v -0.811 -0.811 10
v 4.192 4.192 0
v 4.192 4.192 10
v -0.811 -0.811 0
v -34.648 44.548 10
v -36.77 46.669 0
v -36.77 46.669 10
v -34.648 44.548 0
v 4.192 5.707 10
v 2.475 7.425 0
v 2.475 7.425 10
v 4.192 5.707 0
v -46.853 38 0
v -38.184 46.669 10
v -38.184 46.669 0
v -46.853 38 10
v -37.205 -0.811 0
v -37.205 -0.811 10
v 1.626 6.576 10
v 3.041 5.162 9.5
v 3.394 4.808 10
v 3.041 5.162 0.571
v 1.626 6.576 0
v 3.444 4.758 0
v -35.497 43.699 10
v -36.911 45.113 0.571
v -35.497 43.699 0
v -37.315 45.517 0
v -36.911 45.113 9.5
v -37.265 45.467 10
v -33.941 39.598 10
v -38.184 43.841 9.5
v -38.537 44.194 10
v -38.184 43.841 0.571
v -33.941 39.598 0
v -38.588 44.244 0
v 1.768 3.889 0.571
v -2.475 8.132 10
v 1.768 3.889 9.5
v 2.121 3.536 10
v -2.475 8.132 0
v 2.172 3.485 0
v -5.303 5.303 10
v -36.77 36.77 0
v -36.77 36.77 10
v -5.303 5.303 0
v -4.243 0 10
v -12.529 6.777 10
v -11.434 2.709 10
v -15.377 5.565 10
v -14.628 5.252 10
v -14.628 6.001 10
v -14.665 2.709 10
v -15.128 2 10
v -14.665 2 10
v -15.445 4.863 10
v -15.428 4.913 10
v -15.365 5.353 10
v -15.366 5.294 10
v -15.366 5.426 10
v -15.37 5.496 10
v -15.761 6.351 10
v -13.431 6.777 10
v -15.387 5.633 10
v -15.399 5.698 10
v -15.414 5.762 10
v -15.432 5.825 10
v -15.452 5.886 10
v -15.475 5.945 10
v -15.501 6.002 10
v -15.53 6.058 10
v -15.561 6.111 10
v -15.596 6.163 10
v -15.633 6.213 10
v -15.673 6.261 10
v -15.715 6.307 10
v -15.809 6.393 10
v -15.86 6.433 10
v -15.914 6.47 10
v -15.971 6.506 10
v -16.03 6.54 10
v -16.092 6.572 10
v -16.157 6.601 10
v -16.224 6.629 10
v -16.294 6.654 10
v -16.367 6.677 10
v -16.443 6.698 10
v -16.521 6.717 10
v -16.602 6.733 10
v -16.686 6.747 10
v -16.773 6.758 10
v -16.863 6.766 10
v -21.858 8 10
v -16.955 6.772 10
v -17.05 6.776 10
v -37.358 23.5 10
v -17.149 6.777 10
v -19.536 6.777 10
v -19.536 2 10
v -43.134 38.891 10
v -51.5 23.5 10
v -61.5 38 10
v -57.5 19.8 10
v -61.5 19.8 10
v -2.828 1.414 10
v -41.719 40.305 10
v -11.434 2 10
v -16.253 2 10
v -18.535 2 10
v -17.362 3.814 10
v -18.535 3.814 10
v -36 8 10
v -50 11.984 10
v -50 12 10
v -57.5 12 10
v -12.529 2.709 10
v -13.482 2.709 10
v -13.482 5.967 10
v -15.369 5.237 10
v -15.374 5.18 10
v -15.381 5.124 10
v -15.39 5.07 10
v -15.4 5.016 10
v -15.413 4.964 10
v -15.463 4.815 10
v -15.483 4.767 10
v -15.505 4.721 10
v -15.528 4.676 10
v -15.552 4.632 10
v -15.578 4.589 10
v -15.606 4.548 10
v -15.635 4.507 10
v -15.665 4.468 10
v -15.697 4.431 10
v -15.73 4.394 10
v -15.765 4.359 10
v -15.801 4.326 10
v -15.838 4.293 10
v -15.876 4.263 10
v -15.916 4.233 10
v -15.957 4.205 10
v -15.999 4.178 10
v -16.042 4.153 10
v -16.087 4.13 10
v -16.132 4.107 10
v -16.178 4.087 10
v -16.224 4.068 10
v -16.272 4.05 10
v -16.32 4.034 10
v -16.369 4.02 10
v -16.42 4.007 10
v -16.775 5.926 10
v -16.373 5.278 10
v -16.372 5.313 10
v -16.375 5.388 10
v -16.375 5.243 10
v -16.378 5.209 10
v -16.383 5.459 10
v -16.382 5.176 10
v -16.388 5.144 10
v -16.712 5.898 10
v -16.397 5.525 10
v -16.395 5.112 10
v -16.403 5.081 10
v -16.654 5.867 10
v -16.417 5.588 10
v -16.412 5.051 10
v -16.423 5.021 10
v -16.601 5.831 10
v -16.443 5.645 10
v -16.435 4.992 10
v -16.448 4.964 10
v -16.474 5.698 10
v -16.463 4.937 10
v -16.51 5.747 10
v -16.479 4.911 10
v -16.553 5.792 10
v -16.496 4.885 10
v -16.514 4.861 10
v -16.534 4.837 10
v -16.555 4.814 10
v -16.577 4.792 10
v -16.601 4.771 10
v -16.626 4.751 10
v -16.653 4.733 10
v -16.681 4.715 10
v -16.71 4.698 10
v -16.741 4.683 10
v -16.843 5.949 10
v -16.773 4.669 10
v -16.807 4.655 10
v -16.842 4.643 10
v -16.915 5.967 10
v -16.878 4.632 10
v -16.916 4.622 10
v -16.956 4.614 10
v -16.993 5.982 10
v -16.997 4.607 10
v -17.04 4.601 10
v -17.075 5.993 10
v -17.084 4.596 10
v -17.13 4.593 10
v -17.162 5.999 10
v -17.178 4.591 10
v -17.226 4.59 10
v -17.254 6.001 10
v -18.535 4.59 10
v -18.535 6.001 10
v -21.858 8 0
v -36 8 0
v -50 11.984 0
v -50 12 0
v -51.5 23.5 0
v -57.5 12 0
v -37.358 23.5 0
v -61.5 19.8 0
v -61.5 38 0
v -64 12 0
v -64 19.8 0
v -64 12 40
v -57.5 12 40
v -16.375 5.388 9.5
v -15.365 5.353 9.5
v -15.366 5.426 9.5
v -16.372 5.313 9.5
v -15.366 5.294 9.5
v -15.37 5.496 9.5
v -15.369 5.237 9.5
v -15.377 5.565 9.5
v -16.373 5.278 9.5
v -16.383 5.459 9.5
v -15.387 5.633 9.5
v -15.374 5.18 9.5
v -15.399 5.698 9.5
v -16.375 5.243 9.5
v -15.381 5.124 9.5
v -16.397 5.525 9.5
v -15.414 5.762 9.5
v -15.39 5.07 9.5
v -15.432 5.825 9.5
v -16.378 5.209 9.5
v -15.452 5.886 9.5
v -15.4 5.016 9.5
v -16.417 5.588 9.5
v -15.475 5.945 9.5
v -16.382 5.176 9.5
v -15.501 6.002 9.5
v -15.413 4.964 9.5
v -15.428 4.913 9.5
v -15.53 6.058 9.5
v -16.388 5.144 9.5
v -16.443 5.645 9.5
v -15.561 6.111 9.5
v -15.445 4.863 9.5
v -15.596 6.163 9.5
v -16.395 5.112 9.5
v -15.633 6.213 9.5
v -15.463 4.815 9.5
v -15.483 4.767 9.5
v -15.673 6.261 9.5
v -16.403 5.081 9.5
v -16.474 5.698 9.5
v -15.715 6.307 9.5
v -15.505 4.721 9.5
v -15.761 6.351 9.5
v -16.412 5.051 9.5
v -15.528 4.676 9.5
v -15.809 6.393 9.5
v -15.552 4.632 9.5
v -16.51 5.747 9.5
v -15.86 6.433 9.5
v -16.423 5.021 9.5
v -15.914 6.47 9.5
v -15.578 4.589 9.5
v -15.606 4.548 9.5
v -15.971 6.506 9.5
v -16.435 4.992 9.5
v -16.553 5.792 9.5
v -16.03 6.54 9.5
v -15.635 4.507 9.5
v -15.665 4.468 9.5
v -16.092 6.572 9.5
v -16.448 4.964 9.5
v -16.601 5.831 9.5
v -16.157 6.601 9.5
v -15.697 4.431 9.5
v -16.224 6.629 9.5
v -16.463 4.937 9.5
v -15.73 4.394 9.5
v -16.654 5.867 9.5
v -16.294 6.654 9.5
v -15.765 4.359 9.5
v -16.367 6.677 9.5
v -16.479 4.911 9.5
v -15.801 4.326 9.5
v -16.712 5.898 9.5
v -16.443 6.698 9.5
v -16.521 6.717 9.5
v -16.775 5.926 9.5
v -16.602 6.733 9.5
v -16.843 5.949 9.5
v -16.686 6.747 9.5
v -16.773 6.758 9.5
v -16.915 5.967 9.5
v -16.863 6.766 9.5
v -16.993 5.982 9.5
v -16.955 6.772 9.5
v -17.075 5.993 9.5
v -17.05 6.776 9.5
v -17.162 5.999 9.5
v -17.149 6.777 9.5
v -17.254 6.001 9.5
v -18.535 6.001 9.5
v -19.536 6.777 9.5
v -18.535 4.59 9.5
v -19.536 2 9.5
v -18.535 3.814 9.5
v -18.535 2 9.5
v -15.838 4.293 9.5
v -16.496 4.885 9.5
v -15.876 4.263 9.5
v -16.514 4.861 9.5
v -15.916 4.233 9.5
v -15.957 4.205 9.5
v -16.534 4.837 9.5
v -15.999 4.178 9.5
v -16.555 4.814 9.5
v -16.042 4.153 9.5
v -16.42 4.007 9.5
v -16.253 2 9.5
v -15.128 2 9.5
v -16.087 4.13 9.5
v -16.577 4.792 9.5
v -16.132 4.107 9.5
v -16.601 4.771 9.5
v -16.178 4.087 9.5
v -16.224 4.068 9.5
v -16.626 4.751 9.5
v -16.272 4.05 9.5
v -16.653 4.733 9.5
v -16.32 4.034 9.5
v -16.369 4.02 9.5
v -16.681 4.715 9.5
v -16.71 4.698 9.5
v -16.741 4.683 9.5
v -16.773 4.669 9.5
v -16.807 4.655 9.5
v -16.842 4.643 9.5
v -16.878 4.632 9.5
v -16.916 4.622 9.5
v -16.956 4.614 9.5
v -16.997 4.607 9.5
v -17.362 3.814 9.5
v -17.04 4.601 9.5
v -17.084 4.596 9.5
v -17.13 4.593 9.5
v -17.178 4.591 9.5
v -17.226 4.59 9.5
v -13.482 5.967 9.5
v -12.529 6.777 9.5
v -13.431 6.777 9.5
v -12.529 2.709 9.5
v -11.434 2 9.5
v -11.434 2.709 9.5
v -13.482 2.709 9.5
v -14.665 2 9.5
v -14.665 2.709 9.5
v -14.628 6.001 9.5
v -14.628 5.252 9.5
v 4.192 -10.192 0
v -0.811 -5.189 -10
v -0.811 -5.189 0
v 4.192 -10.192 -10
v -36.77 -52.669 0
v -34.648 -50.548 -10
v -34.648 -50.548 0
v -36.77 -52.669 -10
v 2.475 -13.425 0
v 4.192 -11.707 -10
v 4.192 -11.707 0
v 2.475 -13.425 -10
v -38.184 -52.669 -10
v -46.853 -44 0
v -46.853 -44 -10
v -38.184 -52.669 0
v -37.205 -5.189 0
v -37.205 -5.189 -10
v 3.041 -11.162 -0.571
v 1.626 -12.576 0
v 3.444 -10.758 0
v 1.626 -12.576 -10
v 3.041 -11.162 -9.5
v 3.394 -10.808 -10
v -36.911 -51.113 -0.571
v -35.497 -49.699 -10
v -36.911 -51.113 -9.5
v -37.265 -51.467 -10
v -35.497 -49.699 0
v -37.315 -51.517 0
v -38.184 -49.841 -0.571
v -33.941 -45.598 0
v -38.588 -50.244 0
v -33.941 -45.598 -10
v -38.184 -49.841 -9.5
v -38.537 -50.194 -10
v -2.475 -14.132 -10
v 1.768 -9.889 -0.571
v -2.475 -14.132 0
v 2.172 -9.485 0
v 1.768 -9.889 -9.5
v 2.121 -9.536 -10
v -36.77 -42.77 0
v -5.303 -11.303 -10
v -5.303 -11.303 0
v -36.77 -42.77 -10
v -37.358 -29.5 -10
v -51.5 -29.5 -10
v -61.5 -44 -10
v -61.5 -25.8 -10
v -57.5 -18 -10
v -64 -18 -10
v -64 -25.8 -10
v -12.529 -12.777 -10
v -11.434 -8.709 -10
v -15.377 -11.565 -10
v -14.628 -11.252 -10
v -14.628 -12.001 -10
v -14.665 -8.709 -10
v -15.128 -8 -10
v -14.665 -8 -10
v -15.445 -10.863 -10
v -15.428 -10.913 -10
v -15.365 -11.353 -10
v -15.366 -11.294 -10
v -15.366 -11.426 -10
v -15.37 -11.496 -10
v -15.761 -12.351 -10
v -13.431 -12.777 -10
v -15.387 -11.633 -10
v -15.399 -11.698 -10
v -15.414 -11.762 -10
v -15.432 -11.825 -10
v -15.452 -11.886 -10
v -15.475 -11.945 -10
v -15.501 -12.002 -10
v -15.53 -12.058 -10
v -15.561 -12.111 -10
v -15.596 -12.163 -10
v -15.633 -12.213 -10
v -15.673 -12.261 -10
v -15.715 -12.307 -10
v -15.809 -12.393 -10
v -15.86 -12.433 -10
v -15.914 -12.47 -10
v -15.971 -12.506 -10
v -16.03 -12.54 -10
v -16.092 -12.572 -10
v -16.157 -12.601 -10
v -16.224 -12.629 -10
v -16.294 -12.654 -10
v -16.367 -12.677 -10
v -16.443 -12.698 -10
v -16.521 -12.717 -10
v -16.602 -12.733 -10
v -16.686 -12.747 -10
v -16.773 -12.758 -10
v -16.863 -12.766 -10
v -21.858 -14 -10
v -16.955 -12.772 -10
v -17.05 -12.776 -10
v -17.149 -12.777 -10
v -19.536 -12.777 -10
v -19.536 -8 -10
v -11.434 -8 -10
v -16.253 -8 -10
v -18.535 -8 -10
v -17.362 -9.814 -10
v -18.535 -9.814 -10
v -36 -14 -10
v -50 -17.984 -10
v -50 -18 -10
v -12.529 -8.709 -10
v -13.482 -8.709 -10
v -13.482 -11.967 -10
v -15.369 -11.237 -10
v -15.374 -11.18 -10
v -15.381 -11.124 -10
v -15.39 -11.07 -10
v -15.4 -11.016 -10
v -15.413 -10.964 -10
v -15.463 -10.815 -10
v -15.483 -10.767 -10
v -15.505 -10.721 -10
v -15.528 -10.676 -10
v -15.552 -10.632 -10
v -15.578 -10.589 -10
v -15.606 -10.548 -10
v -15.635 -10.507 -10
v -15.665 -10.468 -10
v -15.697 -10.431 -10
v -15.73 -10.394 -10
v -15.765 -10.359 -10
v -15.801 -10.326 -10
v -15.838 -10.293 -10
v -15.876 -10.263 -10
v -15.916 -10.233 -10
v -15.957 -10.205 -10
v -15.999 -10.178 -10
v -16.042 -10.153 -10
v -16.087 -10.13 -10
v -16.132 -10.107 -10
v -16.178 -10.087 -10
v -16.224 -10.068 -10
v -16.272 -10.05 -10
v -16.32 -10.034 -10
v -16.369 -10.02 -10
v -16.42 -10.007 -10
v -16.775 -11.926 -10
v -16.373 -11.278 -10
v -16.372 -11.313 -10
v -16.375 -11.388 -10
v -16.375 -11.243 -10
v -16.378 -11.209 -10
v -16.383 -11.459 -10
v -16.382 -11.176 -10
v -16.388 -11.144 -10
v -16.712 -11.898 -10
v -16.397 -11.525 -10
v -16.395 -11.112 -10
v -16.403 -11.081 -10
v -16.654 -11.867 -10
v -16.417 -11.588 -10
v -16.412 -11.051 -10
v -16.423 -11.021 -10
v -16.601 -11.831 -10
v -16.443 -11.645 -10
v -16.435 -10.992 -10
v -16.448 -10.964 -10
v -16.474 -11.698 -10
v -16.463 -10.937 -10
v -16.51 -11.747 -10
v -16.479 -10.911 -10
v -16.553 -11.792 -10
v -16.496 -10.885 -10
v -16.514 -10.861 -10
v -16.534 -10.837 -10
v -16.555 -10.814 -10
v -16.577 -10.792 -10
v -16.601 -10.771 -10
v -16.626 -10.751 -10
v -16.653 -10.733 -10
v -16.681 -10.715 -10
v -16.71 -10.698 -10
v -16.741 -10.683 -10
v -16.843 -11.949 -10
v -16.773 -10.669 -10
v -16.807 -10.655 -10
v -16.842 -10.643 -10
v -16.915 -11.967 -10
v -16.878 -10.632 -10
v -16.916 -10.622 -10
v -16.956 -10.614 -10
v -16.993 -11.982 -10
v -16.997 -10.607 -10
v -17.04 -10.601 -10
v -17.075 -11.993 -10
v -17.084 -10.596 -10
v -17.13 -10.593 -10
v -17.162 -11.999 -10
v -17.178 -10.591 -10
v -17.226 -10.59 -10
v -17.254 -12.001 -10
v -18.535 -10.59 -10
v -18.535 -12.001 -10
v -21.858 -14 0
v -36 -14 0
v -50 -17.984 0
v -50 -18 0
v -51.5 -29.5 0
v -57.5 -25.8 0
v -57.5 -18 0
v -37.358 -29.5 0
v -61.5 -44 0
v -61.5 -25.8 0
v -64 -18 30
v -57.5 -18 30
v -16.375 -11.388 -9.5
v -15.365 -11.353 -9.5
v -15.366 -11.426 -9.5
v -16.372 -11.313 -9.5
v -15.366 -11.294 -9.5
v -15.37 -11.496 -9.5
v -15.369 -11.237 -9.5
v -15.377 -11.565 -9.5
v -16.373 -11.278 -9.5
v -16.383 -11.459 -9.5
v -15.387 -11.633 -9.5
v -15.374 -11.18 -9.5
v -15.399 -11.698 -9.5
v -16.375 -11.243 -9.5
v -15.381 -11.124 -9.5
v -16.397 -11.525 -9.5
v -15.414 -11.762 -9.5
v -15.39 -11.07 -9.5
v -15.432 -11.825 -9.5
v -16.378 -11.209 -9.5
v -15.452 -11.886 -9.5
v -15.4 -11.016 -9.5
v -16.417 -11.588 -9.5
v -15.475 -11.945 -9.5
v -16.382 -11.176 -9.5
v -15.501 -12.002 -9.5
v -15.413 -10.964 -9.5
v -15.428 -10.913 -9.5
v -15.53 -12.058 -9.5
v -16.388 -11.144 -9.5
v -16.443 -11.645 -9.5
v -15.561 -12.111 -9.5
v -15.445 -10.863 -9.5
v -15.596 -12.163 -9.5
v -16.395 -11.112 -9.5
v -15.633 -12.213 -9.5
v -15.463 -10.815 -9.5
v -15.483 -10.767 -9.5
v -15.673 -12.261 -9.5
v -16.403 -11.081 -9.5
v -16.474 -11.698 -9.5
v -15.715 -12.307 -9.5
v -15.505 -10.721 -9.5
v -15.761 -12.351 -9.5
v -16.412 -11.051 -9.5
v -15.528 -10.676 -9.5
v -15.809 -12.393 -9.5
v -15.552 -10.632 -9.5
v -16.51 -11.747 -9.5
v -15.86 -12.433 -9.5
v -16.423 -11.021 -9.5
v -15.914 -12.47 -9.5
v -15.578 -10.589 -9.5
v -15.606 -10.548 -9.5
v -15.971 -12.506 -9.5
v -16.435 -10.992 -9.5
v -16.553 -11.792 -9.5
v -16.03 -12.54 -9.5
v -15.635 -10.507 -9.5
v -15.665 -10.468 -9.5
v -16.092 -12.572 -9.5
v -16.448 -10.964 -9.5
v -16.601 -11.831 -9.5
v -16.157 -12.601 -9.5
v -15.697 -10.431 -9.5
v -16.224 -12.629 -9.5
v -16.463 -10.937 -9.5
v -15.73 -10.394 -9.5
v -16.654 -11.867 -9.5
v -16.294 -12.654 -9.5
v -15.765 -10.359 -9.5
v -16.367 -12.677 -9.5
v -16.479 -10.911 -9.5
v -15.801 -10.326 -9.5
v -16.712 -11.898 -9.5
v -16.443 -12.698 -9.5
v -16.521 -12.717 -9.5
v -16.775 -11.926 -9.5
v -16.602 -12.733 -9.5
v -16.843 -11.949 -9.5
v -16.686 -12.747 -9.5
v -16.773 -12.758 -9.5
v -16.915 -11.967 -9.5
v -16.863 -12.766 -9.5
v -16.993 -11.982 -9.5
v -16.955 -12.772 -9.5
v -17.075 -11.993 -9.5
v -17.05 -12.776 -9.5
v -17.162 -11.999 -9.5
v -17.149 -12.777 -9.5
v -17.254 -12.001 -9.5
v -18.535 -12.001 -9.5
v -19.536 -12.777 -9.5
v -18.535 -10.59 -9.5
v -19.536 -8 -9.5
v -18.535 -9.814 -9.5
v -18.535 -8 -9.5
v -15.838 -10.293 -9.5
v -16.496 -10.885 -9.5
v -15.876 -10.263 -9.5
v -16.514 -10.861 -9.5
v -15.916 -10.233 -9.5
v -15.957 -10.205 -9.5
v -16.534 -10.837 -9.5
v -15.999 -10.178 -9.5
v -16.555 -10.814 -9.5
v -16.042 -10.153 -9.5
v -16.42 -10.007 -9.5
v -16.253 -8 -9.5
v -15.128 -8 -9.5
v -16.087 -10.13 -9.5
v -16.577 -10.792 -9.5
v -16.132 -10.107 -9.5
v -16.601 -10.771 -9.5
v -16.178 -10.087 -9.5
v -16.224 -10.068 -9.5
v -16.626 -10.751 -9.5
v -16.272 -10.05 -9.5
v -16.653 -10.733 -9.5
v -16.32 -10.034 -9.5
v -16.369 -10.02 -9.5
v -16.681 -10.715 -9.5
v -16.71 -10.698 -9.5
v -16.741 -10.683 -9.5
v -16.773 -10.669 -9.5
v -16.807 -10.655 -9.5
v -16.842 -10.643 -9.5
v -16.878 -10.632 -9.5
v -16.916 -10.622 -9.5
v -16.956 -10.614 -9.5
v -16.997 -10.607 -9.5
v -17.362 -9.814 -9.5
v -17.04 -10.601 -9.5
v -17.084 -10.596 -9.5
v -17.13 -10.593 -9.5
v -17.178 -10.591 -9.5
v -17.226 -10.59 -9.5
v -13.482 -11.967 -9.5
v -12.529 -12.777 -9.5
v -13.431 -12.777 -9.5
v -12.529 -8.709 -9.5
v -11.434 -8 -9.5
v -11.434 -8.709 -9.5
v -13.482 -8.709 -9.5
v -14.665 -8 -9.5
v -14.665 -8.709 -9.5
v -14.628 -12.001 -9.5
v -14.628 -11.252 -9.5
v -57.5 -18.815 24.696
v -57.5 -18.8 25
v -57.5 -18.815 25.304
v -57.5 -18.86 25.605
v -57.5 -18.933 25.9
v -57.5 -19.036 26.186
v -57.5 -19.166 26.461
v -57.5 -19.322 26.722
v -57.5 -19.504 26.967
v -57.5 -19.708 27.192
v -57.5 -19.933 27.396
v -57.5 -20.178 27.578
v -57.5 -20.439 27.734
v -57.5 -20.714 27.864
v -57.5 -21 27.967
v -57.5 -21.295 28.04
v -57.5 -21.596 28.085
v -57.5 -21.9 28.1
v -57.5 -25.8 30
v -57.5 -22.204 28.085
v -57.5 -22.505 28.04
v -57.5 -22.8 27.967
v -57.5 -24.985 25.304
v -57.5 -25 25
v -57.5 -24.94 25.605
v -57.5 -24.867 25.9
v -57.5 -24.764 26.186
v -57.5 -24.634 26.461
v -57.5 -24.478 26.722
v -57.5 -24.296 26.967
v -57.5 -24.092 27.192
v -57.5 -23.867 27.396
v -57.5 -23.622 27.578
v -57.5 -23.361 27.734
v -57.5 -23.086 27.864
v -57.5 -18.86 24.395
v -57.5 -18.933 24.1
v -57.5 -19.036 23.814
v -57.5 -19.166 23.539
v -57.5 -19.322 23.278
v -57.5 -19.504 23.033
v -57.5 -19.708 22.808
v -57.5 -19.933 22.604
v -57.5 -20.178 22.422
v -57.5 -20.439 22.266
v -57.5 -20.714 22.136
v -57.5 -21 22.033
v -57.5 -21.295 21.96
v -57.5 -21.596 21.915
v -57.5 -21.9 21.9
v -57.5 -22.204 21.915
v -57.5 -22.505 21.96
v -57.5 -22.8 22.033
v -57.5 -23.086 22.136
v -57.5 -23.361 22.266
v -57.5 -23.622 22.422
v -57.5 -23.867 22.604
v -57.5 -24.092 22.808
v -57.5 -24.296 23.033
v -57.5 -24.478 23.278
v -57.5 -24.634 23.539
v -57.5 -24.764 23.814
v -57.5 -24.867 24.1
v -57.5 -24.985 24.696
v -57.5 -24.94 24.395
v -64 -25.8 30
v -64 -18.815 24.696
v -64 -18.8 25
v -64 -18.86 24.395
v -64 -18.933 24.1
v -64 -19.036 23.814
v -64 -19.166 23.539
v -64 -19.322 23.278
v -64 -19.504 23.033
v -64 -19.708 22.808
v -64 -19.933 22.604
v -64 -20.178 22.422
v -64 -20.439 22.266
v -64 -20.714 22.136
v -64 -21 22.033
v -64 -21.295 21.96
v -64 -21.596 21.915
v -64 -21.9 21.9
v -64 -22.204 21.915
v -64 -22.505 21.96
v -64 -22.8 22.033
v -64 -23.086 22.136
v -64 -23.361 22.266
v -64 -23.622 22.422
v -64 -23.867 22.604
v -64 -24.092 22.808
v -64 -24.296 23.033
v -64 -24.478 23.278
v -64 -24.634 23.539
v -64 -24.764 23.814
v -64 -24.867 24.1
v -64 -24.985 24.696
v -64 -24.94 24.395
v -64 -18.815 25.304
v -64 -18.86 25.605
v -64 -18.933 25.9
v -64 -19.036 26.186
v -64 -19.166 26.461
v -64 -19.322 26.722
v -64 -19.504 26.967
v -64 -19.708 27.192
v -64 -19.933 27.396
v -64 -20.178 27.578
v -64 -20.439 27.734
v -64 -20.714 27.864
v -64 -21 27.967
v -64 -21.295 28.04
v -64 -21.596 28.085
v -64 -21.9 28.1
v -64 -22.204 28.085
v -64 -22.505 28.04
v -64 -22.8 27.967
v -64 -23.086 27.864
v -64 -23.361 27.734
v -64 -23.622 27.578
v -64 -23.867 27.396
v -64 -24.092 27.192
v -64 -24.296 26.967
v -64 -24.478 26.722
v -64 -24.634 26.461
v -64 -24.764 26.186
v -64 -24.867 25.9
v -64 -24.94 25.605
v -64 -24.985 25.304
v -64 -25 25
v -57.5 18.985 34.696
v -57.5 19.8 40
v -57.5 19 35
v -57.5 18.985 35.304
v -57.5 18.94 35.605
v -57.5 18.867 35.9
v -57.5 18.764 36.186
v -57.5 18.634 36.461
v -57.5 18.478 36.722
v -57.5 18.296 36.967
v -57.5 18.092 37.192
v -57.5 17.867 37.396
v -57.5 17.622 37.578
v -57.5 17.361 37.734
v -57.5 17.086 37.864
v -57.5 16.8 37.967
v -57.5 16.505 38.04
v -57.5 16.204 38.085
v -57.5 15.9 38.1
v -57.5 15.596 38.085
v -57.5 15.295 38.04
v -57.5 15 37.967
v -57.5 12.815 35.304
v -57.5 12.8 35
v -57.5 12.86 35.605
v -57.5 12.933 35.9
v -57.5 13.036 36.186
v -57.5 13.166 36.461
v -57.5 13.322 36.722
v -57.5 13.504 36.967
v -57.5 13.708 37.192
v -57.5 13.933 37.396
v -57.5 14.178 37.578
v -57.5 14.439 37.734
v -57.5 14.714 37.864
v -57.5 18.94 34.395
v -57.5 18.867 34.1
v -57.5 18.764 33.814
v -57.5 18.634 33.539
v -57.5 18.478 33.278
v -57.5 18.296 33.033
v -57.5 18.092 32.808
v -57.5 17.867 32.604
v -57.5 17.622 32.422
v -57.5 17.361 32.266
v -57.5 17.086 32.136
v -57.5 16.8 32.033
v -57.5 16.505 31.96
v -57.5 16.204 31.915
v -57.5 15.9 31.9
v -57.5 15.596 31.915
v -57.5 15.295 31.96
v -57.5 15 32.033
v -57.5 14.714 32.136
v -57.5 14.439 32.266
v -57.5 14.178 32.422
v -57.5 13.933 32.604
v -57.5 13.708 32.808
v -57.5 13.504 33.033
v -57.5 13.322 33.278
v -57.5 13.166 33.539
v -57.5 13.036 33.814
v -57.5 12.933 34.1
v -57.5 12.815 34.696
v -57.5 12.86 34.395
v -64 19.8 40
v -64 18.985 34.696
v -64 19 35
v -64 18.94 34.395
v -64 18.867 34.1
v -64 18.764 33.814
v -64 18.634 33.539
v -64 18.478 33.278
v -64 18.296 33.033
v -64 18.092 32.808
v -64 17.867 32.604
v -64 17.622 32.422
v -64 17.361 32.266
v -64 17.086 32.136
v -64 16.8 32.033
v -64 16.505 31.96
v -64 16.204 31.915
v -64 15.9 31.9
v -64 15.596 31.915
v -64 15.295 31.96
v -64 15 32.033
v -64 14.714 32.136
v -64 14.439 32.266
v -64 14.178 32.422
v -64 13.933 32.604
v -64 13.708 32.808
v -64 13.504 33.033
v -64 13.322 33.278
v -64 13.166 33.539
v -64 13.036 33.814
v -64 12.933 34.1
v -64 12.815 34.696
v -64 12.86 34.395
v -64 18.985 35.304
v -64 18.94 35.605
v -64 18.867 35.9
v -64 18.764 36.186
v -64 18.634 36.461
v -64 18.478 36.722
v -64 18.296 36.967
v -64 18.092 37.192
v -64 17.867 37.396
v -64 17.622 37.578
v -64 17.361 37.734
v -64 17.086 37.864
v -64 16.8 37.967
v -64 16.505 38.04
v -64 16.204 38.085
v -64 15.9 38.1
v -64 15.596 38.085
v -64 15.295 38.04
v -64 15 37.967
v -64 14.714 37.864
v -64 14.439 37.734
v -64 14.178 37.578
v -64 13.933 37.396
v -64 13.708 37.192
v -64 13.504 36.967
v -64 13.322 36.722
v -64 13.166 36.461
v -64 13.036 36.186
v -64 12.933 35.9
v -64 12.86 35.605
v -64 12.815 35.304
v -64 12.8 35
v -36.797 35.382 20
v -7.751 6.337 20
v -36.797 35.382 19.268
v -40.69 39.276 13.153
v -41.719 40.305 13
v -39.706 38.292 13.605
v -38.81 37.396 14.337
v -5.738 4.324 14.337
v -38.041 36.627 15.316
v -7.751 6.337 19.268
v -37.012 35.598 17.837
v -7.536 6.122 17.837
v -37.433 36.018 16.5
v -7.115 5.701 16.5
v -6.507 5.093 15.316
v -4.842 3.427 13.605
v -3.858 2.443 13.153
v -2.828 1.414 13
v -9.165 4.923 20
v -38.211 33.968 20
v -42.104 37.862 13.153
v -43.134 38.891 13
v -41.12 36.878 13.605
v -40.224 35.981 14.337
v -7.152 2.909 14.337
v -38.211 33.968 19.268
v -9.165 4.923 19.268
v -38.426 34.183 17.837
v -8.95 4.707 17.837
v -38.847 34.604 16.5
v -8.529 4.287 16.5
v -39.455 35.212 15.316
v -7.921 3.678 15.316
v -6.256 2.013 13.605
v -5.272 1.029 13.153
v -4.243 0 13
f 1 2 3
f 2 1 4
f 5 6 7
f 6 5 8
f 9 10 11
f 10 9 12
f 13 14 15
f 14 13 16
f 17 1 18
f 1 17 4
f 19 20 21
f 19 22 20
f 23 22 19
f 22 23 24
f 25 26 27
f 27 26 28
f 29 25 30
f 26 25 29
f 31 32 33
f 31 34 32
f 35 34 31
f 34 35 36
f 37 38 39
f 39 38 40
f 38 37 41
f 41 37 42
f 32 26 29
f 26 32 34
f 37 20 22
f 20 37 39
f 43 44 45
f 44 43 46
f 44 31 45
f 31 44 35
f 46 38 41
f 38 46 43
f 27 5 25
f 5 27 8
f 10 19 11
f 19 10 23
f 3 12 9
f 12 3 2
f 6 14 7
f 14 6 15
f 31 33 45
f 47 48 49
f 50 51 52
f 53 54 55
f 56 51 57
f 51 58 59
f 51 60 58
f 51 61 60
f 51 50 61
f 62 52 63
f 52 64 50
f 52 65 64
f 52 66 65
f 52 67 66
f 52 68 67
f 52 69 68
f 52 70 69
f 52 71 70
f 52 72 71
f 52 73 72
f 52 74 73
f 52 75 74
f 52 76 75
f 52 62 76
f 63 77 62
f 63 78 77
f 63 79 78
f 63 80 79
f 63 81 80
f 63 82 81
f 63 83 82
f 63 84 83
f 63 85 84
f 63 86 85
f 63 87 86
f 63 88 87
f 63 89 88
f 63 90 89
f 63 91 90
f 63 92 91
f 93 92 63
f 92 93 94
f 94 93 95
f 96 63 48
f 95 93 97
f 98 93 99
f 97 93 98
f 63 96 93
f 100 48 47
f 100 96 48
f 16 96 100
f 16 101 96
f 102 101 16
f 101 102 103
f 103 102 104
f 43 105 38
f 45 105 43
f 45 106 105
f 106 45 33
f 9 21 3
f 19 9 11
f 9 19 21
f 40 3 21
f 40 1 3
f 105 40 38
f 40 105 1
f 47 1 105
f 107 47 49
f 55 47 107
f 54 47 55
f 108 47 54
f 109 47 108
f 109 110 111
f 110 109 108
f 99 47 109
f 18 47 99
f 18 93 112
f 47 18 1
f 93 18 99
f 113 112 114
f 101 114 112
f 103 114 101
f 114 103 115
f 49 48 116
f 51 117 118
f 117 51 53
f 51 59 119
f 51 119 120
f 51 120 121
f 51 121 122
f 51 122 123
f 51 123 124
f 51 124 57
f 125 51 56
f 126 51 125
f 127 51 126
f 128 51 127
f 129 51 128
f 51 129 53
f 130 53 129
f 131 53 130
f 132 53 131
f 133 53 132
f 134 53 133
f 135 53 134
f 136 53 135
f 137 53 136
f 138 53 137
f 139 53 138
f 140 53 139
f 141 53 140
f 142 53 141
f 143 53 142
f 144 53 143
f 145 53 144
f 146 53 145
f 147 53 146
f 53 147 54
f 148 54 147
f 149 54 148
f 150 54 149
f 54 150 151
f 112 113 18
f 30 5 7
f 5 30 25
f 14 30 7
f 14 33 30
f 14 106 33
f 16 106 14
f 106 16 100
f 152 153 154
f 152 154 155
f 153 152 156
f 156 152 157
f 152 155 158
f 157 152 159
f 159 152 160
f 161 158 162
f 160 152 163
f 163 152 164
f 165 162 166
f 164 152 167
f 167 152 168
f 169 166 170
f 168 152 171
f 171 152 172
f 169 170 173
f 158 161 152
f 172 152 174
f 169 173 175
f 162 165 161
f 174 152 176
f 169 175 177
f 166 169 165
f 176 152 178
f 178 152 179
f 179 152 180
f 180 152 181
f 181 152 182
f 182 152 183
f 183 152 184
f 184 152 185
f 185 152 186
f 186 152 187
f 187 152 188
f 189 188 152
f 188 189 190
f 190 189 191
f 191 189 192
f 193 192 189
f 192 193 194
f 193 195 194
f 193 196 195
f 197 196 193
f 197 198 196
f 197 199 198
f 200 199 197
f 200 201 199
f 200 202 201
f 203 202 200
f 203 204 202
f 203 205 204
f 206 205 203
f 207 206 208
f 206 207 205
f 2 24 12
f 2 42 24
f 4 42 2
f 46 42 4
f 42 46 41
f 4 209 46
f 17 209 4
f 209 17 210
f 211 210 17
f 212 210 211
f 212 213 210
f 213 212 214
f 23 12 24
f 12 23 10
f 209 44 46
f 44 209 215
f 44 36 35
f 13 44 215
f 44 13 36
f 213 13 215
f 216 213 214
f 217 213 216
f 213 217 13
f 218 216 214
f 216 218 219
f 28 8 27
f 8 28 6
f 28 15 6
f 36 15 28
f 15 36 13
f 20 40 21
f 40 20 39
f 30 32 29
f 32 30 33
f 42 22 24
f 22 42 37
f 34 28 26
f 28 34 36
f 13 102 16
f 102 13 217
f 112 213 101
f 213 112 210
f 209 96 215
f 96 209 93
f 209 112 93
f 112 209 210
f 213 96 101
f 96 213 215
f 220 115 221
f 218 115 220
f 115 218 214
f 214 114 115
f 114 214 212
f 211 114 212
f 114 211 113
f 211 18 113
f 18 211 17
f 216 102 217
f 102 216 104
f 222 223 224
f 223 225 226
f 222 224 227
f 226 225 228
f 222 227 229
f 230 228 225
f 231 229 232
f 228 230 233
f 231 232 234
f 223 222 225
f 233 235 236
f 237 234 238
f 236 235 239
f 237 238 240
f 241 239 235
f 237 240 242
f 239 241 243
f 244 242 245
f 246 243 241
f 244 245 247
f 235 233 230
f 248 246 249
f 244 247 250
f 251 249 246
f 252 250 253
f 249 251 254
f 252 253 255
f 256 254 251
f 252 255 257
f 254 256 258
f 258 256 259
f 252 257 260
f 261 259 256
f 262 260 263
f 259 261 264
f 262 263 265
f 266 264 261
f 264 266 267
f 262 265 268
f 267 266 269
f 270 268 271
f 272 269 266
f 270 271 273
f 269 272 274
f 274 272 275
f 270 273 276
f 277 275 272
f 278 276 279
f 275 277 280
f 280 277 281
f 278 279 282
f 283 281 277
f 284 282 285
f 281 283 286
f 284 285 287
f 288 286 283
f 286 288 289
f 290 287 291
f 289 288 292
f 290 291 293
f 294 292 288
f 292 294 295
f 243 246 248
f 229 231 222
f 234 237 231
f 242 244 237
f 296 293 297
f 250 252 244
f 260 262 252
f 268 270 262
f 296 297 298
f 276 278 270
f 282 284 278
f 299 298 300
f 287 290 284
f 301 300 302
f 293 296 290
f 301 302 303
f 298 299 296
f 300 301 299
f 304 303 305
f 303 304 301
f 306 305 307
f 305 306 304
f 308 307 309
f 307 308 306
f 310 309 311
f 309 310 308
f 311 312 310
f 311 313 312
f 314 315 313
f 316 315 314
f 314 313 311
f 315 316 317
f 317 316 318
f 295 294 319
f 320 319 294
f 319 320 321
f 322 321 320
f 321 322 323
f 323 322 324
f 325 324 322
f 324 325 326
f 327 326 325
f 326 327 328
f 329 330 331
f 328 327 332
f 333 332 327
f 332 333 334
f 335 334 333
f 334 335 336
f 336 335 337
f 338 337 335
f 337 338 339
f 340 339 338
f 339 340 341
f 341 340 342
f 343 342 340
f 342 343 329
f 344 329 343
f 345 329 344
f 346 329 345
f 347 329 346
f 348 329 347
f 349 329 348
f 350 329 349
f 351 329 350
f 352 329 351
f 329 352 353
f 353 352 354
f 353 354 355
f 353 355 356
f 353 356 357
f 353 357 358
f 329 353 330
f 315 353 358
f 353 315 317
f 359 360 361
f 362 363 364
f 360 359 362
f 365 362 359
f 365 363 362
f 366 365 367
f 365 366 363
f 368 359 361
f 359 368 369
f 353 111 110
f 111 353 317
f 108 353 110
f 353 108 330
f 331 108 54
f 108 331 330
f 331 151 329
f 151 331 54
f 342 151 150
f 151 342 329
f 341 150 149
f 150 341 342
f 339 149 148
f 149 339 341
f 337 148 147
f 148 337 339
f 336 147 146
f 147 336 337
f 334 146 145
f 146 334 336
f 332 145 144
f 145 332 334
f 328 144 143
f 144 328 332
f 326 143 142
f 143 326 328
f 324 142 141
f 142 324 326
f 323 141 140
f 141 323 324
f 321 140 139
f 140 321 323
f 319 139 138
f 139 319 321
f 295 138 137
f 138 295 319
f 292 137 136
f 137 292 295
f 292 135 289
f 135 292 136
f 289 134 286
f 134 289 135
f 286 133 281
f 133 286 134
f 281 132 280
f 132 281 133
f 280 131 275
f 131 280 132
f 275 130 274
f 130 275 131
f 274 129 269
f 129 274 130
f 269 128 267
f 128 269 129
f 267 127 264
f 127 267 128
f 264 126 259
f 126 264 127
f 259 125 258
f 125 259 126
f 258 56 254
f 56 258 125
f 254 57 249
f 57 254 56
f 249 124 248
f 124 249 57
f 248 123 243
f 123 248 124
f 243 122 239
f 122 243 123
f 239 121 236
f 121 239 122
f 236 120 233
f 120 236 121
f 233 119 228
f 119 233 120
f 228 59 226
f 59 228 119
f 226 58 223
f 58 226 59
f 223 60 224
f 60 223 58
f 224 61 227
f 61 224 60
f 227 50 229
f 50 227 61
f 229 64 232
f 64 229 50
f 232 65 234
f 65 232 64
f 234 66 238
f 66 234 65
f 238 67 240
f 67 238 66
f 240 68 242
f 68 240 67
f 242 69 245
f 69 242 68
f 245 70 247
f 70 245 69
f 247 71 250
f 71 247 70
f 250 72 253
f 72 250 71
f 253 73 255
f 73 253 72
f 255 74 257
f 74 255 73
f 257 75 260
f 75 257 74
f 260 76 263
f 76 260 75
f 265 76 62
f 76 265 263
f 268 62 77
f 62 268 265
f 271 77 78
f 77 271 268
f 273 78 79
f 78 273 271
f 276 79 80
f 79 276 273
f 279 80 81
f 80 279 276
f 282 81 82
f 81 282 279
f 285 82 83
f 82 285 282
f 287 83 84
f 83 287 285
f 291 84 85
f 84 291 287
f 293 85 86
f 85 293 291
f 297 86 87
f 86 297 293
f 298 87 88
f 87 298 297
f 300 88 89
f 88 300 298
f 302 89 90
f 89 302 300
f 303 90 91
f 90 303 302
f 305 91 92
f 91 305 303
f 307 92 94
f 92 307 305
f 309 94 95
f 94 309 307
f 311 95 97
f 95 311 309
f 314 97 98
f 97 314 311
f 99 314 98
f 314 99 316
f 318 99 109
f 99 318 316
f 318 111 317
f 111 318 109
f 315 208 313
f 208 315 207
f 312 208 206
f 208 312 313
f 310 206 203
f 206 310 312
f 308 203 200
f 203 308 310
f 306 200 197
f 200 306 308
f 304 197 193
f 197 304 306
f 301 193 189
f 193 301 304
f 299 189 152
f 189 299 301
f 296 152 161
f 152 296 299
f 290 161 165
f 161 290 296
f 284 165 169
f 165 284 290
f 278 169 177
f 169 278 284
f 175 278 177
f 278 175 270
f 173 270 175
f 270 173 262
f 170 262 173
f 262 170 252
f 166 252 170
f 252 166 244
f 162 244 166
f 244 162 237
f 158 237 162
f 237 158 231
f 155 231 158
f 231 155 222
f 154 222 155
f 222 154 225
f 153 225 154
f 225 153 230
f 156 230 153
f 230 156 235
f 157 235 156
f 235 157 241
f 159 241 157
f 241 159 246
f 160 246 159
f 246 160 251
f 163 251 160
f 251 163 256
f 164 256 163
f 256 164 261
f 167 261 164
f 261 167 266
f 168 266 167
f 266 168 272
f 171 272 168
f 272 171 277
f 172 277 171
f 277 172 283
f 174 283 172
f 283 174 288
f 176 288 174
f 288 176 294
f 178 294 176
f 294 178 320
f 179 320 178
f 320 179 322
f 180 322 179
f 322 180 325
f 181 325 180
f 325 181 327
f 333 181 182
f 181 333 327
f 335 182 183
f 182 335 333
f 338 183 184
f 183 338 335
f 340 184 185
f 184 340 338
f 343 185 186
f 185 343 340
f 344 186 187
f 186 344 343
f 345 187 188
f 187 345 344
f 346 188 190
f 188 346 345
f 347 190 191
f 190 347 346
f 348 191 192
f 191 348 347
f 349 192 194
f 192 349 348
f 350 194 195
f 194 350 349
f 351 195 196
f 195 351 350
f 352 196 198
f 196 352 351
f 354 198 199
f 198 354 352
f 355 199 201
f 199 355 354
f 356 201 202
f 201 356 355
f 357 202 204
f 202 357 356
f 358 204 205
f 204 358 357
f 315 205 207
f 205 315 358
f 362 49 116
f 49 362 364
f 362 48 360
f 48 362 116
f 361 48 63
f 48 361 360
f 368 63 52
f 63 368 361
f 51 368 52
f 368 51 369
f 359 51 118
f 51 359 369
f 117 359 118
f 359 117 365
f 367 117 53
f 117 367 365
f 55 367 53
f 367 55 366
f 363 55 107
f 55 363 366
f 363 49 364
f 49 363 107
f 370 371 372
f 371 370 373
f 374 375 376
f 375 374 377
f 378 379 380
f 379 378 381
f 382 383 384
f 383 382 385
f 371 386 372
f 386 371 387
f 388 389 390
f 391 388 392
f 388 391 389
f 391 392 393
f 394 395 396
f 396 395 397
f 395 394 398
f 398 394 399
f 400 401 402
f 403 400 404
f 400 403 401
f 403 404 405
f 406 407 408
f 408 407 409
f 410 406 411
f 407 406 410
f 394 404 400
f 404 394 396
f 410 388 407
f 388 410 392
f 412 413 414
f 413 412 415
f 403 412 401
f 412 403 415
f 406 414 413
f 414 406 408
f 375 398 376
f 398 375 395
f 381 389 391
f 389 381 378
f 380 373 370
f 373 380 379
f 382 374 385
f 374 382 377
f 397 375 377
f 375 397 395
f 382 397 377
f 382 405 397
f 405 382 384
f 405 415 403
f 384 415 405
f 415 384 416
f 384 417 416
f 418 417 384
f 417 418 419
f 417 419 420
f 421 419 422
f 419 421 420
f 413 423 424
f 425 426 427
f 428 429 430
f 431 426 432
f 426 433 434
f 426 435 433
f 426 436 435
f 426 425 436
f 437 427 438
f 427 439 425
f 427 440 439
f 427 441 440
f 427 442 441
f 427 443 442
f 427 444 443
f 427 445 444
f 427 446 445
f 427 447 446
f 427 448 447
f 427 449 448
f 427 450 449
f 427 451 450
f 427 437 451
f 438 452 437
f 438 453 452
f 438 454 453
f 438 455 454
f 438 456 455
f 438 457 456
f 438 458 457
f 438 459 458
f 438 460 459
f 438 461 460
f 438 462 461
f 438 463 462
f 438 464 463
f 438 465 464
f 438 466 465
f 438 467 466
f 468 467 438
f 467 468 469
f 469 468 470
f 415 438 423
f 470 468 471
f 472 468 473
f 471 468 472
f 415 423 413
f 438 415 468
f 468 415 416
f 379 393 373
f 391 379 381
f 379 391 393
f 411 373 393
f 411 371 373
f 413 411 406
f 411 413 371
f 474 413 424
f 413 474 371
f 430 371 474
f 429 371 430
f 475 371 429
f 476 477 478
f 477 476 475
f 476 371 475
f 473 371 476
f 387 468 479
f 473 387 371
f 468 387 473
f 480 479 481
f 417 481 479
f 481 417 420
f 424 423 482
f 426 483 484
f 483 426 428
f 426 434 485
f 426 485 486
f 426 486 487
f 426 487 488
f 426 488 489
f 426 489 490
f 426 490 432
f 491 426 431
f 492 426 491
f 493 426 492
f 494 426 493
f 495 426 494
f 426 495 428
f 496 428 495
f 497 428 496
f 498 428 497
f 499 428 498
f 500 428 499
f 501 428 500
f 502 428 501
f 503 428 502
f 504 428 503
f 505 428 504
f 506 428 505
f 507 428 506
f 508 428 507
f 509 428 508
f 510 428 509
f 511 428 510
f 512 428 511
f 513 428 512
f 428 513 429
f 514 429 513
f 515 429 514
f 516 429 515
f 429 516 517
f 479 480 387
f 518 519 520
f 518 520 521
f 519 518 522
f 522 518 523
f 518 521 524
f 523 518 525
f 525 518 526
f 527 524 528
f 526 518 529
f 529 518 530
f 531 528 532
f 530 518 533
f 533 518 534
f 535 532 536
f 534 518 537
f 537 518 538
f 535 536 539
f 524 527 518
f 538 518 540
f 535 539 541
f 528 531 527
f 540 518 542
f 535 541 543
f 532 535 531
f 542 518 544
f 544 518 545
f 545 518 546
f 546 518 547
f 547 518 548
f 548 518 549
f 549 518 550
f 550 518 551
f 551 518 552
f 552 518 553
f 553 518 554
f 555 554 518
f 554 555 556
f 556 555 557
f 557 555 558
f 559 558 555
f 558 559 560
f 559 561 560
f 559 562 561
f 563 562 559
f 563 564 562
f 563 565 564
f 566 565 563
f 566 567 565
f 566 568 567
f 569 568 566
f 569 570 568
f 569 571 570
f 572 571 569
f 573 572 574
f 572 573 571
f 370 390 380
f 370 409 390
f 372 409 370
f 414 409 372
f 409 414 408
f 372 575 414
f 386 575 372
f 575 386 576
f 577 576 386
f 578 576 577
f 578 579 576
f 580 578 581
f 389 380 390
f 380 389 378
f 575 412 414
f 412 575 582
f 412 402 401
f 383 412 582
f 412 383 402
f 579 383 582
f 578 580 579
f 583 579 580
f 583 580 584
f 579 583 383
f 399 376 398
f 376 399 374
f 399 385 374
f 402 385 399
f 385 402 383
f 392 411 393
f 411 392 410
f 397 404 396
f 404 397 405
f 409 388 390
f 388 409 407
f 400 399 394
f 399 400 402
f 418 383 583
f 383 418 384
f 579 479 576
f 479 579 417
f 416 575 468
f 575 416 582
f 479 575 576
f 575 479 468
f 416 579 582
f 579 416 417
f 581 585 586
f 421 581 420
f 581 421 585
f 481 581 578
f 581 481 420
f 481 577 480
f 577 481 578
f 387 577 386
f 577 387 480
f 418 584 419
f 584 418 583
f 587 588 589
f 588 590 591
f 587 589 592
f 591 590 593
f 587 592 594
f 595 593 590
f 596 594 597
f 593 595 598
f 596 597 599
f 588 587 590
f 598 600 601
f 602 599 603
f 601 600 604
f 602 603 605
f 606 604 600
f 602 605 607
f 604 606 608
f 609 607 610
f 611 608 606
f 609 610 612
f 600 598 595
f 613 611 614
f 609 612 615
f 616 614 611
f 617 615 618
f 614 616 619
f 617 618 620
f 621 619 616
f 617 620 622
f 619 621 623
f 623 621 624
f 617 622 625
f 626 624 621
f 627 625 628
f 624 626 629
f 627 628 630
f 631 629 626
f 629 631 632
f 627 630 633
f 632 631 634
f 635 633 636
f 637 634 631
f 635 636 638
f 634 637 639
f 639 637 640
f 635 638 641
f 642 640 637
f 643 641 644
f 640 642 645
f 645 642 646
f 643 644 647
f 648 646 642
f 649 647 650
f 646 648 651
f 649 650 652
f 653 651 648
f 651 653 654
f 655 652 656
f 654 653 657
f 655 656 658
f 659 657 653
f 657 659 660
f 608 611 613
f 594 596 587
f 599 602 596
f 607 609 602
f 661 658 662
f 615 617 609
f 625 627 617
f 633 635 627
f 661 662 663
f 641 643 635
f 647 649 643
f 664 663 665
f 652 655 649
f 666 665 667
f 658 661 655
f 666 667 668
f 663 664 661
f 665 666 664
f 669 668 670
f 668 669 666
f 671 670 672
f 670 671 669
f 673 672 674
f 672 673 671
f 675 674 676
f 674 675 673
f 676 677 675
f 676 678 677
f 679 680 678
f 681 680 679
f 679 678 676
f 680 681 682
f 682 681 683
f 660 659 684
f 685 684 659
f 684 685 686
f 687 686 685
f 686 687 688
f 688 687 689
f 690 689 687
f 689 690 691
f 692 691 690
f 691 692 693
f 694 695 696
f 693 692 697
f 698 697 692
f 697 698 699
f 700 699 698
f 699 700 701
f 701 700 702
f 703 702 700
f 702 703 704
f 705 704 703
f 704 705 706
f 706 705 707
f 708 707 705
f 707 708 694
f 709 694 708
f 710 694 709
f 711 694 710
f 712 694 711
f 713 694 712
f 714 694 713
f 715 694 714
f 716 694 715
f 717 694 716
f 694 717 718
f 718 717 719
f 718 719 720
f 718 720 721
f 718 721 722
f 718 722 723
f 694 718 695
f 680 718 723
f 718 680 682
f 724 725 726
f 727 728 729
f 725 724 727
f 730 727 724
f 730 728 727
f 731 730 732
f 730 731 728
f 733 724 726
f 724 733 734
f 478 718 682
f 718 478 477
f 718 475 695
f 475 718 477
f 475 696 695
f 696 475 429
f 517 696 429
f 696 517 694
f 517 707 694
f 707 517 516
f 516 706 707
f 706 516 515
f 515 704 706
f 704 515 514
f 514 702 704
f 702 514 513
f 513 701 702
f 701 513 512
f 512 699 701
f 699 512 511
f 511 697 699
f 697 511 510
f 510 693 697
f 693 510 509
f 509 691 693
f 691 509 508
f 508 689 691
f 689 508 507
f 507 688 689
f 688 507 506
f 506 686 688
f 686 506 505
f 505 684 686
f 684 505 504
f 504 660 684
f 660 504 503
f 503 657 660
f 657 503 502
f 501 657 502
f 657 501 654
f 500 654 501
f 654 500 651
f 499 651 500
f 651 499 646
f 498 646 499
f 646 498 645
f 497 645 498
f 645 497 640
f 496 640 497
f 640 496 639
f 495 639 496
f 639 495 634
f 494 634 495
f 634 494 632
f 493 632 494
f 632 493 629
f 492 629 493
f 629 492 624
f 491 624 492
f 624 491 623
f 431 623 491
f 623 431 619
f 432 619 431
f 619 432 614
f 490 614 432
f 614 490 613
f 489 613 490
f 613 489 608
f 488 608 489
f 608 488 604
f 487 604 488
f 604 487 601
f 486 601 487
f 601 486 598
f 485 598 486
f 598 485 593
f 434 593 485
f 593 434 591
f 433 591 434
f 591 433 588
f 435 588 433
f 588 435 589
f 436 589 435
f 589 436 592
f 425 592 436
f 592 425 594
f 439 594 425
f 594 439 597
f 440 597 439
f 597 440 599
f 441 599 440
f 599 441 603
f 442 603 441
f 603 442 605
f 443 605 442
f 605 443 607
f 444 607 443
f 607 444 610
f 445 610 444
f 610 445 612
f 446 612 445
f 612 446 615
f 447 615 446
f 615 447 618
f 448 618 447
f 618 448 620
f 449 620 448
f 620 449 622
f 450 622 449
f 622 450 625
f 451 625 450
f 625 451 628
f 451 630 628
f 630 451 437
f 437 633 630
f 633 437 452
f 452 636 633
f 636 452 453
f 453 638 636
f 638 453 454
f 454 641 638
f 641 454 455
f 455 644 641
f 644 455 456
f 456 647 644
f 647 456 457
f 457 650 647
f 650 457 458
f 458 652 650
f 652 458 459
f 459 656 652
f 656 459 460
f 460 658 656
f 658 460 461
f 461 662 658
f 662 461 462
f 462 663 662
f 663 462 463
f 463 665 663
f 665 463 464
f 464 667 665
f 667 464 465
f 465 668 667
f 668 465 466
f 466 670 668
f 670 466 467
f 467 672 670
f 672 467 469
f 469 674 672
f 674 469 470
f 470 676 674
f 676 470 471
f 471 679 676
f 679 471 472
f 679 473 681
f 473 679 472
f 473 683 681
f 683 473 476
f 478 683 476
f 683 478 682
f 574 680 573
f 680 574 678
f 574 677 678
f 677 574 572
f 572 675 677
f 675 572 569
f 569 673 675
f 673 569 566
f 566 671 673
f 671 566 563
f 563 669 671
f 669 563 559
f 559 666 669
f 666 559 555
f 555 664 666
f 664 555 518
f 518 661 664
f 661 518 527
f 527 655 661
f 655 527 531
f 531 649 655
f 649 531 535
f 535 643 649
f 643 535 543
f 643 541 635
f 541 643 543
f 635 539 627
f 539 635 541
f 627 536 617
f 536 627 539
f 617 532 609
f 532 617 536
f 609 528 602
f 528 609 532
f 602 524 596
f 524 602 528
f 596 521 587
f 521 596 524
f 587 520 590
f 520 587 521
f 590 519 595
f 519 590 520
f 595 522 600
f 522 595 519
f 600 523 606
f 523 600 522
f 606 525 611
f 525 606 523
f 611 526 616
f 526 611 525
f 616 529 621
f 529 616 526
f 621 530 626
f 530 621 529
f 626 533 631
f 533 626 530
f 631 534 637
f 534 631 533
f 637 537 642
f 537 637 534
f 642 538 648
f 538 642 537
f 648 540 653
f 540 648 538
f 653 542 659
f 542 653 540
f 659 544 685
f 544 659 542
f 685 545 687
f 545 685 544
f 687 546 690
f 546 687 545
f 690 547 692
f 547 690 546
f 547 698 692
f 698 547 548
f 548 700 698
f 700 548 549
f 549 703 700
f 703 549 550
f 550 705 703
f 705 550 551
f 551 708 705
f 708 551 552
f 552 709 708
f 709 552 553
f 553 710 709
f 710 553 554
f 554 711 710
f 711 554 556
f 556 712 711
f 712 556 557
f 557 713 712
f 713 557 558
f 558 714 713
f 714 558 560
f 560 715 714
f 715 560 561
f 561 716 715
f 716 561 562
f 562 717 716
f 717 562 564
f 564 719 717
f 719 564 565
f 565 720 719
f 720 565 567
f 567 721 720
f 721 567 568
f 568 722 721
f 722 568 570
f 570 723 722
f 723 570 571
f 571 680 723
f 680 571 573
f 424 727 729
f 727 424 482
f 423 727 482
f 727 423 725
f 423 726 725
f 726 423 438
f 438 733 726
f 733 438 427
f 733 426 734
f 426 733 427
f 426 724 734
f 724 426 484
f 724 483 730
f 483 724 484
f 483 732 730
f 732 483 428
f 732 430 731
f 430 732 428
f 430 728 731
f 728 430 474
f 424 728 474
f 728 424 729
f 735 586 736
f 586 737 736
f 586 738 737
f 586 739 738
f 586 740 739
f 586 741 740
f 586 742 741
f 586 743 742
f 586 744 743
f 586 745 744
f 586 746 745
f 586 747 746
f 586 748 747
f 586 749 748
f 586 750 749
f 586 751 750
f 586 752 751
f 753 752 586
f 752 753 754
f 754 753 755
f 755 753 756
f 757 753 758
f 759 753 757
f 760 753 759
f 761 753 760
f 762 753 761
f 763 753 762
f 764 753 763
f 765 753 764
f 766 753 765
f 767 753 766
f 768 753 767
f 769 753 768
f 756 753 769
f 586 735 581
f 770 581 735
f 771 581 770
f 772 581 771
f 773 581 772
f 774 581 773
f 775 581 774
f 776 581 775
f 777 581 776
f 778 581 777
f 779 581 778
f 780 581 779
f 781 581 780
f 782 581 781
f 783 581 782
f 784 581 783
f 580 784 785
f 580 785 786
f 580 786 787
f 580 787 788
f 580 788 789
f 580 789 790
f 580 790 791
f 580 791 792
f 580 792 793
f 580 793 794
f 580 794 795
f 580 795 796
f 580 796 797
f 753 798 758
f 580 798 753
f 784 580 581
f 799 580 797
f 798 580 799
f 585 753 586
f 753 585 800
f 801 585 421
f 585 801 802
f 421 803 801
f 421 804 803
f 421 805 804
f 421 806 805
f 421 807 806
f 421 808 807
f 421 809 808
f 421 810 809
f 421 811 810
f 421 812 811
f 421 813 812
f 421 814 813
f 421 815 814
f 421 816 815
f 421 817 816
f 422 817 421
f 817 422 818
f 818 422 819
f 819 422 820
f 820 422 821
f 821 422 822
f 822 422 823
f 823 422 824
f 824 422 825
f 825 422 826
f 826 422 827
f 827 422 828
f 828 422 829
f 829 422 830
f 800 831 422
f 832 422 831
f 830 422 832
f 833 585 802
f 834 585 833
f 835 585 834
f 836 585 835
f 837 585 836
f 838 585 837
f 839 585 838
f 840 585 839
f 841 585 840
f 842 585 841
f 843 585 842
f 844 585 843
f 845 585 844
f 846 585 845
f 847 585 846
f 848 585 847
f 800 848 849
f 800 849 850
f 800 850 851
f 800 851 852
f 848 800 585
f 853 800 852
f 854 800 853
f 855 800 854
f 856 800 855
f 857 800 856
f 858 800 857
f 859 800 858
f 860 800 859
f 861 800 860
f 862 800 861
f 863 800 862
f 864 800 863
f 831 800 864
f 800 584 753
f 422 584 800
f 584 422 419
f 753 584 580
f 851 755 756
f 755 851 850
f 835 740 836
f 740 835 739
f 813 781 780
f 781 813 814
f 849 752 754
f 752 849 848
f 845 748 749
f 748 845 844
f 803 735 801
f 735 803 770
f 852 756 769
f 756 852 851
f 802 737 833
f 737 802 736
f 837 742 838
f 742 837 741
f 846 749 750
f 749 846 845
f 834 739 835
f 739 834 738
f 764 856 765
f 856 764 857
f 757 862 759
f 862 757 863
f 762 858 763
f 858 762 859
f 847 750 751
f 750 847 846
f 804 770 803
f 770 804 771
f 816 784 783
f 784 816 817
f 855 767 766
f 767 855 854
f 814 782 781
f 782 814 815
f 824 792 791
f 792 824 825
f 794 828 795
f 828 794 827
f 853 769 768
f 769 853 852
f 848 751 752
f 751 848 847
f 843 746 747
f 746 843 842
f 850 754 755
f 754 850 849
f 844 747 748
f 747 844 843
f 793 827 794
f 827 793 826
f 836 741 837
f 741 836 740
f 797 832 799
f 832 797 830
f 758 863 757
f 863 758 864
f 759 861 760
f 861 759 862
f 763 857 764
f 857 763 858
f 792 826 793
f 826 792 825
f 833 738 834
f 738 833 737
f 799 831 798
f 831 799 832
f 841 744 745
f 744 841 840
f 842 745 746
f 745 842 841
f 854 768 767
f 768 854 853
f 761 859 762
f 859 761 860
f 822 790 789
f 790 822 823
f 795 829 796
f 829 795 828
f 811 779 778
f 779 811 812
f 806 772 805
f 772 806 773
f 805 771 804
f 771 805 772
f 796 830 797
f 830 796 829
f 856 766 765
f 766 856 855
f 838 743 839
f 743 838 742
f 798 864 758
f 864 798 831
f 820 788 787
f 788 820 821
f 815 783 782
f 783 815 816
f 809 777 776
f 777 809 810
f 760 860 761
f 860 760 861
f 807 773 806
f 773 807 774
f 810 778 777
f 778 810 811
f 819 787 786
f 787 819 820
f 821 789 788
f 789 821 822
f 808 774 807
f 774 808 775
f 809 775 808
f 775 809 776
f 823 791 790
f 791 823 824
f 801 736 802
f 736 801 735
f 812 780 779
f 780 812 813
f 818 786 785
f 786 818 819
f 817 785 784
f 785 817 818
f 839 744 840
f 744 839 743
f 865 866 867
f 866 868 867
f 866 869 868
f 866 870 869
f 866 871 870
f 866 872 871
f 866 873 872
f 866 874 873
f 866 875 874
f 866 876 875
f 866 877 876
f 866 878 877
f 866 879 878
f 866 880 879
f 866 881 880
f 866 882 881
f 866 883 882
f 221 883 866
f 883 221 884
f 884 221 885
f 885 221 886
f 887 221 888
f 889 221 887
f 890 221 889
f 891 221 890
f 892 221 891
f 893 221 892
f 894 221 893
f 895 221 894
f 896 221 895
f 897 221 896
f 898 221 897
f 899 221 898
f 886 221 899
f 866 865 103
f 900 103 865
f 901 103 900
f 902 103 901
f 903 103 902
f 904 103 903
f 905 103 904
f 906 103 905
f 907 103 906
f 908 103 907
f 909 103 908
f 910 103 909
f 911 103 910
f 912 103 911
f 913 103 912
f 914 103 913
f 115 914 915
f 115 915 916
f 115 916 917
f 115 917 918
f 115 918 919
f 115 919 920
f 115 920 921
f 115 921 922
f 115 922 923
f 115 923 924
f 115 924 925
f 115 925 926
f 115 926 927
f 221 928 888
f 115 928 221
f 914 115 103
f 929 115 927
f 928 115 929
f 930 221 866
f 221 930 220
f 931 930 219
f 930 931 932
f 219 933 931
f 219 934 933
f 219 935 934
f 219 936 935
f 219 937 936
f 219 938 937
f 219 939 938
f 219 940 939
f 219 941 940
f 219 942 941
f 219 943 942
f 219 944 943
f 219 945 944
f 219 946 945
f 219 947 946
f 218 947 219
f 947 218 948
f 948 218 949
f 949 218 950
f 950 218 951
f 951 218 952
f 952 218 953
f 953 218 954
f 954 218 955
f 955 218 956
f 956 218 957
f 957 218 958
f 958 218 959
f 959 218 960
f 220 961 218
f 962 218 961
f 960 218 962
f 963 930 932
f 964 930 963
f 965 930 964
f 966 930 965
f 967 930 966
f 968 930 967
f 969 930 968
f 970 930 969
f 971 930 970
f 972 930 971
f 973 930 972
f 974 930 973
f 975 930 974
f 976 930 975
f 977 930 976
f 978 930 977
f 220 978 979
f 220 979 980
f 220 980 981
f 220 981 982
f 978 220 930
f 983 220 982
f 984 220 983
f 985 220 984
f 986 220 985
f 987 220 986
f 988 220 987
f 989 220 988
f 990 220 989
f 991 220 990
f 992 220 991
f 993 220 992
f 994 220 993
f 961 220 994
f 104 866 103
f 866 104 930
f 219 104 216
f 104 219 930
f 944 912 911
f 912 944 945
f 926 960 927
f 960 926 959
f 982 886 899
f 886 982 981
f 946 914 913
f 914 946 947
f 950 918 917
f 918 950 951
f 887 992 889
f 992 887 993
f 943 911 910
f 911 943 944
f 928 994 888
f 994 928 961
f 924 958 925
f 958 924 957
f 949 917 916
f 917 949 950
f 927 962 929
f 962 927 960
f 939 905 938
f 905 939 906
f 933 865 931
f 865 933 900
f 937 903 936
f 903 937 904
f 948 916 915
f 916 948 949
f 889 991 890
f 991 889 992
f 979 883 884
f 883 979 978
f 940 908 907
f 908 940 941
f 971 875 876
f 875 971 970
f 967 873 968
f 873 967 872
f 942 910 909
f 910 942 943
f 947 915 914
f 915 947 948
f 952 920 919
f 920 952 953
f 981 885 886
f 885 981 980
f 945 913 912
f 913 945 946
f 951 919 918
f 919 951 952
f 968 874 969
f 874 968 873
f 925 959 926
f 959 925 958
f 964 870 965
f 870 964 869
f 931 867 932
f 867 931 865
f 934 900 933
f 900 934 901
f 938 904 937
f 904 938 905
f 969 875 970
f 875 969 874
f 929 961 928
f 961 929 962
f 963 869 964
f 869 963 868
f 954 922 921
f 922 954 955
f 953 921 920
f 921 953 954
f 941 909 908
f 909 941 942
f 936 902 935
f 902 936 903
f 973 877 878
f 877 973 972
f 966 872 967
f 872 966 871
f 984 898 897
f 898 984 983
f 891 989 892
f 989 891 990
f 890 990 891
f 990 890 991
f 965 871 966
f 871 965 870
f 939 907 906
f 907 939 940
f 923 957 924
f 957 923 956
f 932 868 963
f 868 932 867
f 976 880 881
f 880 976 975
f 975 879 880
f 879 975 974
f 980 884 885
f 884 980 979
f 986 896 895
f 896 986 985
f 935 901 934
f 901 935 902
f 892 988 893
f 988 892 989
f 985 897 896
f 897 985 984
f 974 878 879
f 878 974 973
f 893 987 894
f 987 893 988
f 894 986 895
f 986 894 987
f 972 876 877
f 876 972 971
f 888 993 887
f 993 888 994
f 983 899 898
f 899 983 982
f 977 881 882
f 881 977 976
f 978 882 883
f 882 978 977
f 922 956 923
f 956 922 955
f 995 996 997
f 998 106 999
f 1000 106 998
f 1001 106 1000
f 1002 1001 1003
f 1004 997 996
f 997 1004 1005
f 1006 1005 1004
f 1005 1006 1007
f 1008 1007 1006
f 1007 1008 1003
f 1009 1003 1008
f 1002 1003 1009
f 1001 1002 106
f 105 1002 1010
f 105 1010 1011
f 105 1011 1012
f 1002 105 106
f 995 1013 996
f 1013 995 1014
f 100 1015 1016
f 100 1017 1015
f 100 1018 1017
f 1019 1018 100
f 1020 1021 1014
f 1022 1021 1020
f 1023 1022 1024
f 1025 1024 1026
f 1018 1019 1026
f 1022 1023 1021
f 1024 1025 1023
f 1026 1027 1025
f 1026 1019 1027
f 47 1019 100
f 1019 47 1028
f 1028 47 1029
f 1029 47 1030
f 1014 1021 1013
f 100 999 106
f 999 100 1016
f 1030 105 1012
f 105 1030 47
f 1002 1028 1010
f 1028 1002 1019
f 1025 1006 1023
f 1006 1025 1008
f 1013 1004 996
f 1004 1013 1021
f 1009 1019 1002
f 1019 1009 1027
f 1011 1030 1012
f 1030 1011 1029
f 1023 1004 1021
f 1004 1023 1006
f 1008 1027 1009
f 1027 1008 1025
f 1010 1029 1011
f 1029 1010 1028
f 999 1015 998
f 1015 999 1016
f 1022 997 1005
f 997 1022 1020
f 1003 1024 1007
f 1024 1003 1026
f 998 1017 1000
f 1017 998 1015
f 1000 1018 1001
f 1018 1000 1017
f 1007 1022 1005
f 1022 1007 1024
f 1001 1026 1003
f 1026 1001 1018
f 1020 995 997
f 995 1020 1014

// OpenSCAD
// PRUSA iteration4
// lcd supports
// GNU GPL v3
// Josef Průša <iam@josefprusa.cz> and contributors
// http://www.reprap.org/wiki/Prusa_Mendel
// http://prusamendel.org

// Modified to fit 4040 profile


$fn=64;

module body()
{

    difference() 
        {
        // base block
        translate([-55,-2,0]) cube([69,81,10]); 

            union ()
            {
                // outer body shape
                translate([-69.6,32,-1]) rotate([0,0,45]) cube([60,53,15]); 
                translate([13.7,89.7,-1]) rotate([0,0,135]) cube([60,42,15]);
                translate([-19,-9,-1]) cube([60,9,15] );   
                translate([7,-3,-1]) cube([60,68,16]);  
                translate([-16,60,-1]) cube([60,50,15] );
                translate([-41, -45,-1]) rotate([0,0,45]) cube([60,80,13]);  
                
                // pcb cout out
                translate([4,1.5,-1]) cube([1.8,56.5,17]); 
                translate([0,7.5,-1]) cube([5.8,44.5,17]); 
                translate([4.8,3.5,-1]) cube([5.8,52.5,17]);
                translate([8,-5,-1] ) rotate([0,0,45]) cube([5,5,17]);
                translate([8,58,-1]) rotate([0,0,45]) cube([5,5,17]);
            }

            // pcb inserts
            translate([4,3,8]) rotate([45,0,0]) cube([1.8,5,5]); 
            translate([4,56.5,8]) rotate([45,0,0]) cube([1.8,5,5]);     
            translate([4,3,-5]) rotate([45,0,0]) cube([1.8,5,5]); 
            translate([4,56.5,-5]) rotate([45,0,0]) cube([1.8,5,5]);     
        }
}



module support()
{
    difference() 
    {
    
        union()
        {
            rotate([0,0,45]) body();
            // screw block
            translate([-72,22,0])  cube([30,16,10]);    
         
        }
        
        // lower angled part cut
        translate([-75,-2,-1])  cube([20,14,15]);    
        translate([-70,-2,-1]) cube([20,14,15]);    
        translate([-50,-16.3,-1]) rotate([0,0,45]) cube([20,20,15]);    
        
        translate([-76.5,-2,-1]) cube([15,40,15]);    
        
        difference()
        {
            translate([-28,0,-1]) rotate([0,0,45]) cube([10,40,15]);    
            translate([-38,-12,-1]) cube([20,20,15]);    
            translate([-58,23.5,-1]) cube([25,25,15]);    
        }
        
        // screw holes
        //translate([-71,18+4,5]) rotate([0,90,0]) cylinder(h=22, r=1.75, $fn=30);  
        //translate([-70,29+4,5]) rotate([0,90,0]) cylinder(h=22, r=1.75, $fn=30);  
        
        // nut traps
        //translate([-58,15.1+4,5-2.8]) cube([2.2,5.8,29.7]);    
        //translate([-58,26.1+4,5-2.8]) cube([2.2,5.8,29.7]); 
     
       
        // version
        translate([-20,2,9.5]) rotate([0,0,0]) linear_extrude(height = 0.6) 
        { text("R1",font = "helvetica:style=Bold", size=5, center=true); }   
    }
}


module left_lcd_support()
{
    union(){
        support();
        translate([-64,12,0]) 
        difference(){
        cube([6.5,7.8,40]);
            translate([0,3.9,35]) 
            rotate([0,90,0]) 
            cylinder(h=20, d=6.2, center=true);
            }
        }
    rotate([0,0,45]) difference()
    {
        // sd card shield
        translate([-3,3,10])  cube([2,55,10]); 
        translate([-4,3,20]) rotate([0,90,0]) cylinder( h=4, r=7, $fn=30); 
        translate([-4,58,20]) rotate([0,90,0]) cylinder( h=4, r=7, $fn=30); 
    }
}

module right_lcd_support()
{
    translate([0,-6,0]) rotate([0,180,180]) 
    union(){
        support();
        translate([-64,12,-30]) 
        difference(){
        cube([6.5,7.8,40]);
            translate([0,3.9,5]) 
            rotate([0,90,0]) 
            cylinder(h=20, d=6.2, center=true);
            }
    }
    
}

right_lcd_support();
left_lcd_support();

 
